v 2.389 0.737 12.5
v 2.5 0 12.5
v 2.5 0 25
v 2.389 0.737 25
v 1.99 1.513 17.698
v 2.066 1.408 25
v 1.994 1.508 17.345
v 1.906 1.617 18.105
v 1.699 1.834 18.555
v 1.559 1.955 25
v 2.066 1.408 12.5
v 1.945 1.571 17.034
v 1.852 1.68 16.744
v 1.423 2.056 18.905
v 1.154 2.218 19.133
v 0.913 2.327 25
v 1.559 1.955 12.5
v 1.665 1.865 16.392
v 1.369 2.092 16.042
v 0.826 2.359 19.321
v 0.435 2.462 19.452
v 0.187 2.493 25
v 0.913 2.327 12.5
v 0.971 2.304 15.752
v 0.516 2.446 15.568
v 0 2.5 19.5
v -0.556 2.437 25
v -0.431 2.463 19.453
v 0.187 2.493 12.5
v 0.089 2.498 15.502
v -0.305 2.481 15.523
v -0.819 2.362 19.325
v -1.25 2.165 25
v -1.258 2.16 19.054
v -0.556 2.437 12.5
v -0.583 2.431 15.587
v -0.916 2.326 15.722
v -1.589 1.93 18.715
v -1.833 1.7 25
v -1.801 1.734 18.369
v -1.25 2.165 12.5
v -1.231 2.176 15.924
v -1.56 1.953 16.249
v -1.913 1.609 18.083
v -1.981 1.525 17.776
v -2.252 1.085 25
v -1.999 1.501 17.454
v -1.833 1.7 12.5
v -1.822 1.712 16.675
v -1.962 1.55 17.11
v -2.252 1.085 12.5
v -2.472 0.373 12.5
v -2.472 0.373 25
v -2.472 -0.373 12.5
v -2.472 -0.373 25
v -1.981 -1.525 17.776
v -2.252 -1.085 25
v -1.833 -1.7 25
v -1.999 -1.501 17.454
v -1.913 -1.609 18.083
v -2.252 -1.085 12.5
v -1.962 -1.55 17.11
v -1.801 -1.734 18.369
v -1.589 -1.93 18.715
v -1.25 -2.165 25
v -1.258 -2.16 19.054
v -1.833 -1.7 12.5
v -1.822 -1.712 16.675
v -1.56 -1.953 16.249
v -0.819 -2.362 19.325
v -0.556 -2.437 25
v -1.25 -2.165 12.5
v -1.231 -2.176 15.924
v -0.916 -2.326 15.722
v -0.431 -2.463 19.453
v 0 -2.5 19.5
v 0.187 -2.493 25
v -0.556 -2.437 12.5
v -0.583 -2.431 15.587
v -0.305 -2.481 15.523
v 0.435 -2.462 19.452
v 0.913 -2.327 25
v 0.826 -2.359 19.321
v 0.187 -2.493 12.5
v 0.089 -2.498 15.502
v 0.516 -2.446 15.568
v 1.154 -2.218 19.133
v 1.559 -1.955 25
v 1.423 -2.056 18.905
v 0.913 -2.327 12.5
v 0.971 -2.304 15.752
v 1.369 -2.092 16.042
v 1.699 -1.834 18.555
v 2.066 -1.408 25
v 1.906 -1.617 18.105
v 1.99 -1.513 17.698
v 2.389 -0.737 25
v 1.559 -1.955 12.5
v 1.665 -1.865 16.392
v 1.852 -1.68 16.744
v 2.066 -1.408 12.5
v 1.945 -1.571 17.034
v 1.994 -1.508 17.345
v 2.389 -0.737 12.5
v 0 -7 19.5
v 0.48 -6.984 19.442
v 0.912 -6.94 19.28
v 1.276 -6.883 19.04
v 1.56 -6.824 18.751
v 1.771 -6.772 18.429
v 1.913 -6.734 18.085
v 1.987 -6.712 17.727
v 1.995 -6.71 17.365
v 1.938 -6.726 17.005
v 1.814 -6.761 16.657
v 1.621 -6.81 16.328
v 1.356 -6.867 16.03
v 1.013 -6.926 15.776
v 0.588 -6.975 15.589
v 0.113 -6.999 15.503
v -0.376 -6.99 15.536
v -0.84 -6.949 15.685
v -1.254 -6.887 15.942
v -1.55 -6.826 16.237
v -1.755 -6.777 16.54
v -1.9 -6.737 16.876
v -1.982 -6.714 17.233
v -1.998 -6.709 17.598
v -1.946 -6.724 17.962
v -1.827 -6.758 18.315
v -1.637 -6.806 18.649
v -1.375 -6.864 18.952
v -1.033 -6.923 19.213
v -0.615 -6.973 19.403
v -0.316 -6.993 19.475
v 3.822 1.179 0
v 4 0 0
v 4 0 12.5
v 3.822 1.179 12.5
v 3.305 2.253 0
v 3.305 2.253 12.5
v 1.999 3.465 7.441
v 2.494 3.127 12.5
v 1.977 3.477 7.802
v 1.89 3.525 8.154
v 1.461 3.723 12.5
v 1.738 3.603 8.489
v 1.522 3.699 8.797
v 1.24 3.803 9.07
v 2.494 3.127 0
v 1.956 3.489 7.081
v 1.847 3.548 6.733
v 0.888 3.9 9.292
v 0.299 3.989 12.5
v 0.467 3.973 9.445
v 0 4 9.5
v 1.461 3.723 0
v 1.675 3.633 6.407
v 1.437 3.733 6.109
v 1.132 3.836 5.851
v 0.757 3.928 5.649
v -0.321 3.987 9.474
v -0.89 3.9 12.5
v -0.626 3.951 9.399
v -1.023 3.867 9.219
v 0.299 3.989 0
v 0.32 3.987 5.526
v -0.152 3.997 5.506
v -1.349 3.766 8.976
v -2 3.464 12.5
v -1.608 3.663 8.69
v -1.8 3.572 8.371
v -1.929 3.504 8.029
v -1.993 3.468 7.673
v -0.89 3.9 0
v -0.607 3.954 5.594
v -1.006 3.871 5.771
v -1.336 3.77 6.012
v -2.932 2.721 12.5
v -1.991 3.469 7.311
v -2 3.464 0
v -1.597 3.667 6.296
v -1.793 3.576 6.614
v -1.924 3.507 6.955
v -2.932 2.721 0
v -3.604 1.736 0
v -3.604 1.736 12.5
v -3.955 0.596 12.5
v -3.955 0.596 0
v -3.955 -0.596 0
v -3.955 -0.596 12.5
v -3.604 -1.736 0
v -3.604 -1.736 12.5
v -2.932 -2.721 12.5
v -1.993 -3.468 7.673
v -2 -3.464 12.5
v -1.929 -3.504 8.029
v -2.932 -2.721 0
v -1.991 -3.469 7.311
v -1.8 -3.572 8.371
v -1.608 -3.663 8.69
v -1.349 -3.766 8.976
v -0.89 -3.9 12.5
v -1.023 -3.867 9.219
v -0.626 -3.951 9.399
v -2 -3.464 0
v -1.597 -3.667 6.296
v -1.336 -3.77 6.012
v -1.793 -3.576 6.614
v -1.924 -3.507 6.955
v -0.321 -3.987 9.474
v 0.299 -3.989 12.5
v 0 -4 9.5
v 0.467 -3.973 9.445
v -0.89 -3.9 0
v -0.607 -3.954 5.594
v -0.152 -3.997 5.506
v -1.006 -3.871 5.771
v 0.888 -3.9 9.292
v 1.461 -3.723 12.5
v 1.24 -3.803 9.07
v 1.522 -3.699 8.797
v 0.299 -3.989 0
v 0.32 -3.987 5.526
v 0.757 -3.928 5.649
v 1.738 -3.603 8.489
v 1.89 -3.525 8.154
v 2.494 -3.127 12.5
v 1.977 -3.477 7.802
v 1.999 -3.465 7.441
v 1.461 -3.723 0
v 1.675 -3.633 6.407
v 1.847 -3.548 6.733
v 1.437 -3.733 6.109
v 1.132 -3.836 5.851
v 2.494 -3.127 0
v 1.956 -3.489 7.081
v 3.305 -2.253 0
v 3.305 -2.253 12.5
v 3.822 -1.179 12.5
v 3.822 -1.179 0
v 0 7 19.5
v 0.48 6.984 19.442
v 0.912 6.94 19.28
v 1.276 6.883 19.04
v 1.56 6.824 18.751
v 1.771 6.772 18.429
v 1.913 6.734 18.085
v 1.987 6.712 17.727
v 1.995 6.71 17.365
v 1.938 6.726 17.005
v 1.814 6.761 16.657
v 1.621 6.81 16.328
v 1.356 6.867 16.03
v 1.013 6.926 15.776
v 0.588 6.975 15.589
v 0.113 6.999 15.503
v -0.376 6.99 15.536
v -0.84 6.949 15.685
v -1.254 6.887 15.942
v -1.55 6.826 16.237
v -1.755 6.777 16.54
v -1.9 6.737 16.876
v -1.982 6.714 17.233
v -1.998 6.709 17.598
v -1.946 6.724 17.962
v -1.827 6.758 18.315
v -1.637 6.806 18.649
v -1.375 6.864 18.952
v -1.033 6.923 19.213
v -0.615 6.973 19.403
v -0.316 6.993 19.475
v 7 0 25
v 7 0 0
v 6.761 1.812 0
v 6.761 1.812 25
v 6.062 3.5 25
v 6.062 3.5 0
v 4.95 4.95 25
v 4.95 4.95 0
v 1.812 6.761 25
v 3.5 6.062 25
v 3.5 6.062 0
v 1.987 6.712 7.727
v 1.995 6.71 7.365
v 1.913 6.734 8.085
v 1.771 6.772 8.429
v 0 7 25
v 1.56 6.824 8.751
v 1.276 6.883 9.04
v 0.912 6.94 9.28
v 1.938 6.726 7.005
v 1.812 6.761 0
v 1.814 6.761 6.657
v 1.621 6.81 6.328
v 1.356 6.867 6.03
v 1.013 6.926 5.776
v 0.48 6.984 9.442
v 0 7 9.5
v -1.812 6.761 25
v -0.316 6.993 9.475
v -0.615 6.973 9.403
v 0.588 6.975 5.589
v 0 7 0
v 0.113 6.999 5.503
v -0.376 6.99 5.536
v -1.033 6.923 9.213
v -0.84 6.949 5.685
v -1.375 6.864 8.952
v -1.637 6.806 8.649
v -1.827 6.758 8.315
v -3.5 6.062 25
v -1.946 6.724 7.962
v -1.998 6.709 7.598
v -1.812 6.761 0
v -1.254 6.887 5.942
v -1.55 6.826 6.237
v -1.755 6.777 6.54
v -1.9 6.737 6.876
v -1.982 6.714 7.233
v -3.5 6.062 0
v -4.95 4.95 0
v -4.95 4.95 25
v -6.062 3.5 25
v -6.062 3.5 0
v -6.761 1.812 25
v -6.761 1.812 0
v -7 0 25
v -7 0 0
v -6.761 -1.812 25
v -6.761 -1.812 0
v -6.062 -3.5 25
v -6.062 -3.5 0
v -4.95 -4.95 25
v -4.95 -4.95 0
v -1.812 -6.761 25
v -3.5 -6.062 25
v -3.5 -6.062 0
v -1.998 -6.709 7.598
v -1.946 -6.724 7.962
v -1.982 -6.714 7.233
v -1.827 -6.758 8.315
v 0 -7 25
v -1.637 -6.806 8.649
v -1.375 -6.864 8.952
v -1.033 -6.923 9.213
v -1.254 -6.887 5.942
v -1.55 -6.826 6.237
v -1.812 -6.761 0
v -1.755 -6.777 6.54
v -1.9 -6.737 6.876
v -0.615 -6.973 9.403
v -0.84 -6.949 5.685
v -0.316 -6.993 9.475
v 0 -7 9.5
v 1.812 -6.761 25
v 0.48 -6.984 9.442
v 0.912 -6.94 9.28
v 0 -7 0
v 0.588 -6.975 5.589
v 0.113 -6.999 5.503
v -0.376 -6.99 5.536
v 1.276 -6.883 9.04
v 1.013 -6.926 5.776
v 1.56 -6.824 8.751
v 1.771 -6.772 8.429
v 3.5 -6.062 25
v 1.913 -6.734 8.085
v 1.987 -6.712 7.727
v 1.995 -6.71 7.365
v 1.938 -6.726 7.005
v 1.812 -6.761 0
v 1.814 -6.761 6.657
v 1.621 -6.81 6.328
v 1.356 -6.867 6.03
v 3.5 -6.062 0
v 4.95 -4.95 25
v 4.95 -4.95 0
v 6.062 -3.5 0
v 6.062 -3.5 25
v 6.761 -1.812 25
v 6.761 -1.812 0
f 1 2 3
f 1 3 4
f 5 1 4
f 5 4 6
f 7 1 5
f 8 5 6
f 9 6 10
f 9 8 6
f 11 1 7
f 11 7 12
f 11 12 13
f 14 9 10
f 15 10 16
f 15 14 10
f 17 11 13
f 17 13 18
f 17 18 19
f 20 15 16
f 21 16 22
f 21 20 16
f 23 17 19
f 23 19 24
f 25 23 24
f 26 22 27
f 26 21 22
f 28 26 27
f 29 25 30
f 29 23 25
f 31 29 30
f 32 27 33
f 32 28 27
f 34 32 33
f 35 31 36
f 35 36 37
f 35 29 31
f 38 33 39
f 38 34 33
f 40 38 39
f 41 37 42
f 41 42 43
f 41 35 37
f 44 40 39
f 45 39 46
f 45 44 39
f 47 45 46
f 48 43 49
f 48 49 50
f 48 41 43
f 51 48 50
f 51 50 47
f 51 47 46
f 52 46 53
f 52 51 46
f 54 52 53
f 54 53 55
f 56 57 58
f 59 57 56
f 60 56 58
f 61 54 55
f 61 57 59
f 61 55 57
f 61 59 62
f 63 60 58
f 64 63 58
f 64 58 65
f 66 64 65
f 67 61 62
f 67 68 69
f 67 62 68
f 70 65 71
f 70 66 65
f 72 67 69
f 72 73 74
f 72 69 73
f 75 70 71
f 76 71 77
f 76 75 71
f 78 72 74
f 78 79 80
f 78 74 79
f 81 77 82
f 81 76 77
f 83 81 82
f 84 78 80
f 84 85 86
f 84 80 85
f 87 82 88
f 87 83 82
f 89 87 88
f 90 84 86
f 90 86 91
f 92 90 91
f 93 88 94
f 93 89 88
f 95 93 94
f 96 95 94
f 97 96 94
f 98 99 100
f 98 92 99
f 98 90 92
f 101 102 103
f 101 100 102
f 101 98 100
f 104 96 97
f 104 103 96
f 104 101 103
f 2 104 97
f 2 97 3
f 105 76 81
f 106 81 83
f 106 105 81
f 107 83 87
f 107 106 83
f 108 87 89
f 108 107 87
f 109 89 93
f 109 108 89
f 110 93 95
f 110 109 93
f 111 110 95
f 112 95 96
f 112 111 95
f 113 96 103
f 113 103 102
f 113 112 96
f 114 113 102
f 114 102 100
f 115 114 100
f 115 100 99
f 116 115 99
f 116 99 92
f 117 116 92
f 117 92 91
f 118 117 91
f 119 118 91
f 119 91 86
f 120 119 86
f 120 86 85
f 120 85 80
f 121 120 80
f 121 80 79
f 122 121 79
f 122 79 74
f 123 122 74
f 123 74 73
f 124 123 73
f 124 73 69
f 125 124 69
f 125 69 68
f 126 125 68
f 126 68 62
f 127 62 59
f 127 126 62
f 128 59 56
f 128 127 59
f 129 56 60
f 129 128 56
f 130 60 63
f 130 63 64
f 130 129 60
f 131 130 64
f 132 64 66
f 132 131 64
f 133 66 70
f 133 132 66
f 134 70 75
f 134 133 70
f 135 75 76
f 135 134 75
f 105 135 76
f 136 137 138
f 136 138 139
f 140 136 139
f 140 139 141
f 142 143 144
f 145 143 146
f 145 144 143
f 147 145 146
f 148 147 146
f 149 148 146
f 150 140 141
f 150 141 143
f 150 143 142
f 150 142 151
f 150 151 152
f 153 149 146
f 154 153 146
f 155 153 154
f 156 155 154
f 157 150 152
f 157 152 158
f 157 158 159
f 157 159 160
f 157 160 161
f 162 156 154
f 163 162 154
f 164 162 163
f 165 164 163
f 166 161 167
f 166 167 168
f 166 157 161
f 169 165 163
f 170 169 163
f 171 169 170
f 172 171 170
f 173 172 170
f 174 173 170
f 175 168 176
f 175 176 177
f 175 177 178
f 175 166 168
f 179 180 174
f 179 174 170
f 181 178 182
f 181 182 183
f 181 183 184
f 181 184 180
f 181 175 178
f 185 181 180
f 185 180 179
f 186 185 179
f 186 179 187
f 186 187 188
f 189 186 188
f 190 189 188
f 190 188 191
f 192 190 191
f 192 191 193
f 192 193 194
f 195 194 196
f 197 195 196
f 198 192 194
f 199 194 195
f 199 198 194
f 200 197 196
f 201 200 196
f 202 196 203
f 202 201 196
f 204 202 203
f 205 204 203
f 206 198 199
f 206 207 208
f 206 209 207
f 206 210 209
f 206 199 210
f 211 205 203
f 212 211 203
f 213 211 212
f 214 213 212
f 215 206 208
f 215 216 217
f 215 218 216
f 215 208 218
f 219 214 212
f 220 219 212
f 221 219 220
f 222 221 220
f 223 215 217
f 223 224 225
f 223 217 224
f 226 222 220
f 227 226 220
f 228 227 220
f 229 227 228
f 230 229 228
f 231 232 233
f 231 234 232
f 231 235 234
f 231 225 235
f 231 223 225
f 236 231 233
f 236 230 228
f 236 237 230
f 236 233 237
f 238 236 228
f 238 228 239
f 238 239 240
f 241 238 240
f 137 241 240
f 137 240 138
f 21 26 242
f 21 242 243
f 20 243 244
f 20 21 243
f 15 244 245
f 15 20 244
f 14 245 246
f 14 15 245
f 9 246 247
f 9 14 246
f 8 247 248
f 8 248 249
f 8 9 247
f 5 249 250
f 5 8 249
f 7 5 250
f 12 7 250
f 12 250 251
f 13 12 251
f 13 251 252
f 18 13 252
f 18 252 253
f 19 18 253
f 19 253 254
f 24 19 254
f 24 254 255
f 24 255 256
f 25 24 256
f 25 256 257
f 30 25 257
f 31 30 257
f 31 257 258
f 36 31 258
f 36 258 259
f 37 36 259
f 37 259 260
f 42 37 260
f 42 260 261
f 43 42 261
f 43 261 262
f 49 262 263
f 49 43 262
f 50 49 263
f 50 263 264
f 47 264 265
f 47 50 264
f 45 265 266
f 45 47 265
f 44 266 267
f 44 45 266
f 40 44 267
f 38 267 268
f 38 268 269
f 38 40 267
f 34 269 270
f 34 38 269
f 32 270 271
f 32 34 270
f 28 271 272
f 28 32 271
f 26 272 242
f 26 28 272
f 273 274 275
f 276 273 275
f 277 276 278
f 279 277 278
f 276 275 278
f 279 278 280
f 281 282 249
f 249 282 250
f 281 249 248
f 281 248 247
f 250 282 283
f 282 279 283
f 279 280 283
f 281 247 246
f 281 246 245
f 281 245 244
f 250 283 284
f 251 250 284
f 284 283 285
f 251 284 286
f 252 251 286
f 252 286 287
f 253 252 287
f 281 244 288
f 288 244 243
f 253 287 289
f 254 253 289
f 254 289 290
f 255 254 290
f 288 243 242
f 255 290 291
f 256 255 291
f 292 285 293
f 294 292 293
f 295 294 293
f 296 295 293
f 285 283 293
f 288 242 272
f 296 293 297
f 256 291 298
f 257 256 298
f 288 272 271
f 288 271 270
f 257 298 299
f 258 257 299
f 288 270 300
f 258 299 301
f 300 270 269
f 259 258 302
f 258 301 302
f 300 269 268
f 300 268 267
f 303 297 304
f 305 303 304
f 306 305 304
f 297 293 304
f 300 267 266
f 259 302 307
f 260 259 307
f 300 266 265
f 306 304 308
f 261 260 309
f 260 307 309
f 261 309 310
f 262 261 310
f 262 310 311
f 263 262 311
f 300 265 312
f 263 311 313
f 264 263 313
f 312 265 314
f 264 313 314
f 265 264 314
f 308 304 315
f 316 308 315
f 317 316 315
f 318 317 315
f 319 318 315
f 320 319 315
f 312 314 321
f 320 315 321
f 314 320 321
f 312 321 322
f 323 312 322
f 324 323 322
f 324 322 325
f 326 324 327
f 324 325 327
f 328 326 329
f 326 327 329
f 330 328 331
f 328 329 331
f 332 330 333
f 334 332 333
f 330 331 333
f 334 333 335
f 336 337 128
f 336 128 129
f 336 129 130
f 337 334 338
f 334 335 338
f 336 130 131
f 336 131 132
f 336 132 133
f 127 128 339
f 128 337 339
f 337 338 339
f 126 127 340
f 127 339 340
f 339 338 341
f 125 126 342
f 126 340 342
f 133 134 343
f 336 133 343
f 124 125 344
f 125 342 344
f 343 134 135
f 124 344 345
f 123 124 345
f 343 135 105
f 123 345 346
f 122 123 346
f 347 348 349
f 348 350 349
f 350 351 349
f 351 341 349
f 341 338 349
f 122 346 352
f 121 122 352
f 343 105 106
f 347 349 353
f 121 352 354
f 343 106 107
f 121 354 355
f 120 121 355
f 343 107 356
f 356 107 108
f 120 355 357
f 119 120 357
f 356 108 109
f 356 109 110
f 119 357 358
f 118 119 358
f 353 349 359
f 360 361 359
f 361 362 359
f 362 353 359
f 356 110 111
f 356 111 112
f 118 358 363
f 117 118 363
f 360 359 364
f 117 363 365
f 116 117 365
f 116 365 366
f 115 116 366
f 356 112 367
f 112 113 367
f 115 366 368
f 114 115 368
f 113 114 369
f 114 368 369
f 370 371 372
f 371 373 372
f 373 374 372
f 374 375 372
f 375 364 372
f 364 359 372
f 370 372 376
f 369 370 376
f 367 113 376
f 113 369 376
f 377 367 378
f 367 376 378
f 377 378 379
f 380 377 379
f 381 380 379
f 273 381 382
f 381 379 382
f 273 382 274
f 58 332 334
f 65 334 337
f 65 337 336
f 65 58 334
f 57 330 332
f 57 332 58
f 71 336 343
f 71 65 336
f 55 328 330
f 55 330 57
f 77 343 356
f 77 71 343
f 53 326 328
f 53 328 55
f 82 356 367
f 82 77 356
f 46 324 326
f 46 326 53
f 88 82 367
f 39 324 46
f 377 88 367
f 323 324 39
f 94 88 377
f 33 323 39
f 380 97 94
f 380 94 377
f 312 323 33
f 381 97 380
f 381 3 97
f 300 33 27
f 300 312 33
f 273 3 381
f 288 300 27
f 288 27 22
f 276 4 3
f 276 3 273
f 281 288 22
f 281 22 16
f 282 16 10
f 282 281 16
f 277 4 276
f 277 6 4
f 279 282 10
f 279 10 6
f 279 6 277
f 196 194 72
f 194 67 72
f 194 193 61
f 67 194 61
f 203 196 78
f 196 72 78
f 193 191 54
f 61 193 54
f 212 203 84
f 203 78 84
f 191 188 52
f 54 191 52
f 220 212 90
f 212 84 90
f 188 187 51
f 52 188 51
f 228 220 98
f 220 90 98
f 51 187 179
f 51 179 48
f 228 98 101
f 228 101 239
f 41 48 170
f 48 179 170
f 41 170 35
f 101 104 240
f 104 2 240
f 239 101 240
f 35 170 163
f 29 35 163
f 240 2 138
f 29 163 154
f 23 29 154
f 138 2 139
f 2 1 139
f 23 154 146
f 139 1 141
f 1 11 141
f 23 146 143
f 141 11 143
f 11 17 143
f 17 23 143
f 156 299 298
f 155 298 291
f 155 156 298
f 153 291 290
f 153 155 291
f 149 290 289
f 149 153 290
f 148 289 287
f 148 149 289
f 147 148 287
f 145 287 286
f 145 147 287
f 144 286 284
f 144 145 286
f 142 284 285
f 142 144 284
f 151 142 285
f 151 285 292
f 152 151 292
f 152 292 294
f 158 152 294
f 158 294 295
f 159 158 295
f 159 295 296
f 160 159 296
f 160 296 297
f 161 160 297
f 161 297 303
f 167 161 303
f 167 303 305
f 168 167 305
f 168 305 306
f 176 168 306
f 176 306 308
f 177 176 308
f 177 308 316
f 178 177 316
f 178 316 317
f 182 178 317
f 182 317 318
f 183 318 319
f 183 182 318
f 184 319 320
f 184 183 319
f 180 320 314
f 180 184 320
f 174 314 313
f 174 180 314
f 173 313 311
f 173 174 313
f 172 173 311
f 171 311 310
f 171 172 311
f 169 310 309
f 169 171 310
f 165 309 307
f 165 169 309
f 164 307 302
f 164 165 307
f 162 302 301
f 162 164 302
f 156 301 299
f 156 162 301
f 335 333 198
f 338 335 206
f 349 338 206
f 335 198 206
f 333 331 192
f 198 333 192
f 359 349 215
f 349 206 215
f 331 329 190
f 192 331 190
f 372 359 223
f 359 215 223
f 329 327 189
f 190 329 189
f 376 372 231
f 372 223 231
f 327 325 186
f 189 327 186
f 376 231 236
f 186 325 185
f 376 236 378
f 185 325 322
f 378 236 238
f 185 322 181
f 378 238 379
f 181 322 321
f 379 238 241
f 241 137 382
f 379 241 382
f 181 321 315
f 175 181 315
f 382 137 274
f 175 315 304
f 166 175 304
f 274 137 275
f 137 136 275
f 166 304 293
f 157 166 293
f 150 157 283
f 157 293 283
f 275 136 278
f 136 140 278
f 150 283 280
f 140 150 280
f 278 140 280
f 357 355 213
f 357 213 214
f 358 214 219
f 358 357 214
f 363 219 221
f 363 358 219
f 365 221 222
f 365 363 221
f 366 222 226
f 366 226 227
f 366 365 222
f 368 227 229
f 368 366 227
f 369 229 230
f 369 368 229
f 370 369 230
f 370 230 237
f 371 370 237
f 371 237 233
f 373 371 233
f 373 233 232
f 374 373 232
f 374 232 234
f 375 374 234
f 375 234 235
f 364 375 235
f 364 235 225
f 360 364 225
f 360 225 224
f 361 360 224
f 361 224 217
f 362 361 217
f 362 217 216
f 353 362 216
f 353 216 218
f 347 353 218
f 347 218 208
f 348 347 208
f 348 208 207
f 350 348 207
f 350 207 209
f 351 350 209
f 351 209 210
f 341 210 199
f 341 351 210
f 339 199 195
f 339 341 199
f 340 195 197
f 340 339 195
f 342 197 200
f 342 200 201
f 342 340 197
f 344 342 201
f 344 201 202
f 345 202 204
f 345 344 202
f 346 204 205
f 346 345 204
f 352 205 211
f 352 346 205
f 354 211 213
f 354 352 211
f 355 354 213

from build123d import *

# Parameters (mm, degrees)
SKETCH1_R               = 7
SKETCH1_R_2             = 4
BOSS_EXTRUDE1_DEPTH     = 25
BOSS_EXTRUDE2_START     = -12.5
SKETCH2_R               = 4
SKETCH2_R_2             = 2.5
BOSS_EXTRUDE2_DEPTH     = 12.5
CUT_EXTRUDE1_DEPTH      = 27.888659319
CUT_EXTRUDE1_DEPTH_BACK = 27.888659319
SKETCH3_R               = 2


with BuildPart() as part:
    # Sketch1 → Boss-Extrude1 (new body)
    with BuildSketch(Plane.XY):
        Circle(SKETCH1_R)
        Circle(SKETCH1_R_2, mode=Mode.SUBTRACT)
    extrude(amount=BOSS_EXTRUDE1_DEPTH)

    # Sketch2 → Boss-Extrude2 (add)
    with BuildSketch(Plane.XY.offset(25).offset(BOSS_EXTRUDE2_START)):
        Circle(SKETCH2_R)
        Circle(SKETCH2_R_2, mode=Mode.SUBTRACT)
    extrude(amount=BOSS_EXTRUDE2_DEPTH)

    # Sketch3 → Cut-Extrude1 (cut, two sides: drawn at the far end of the back side and taken through both)
    with BuildSketch(Plane(origin=(0, 0, 0), x_dir=(1, 0, 0), z_dir=(0, 1, 0)).offset(-CUT_EXTRUDE1_DEPTH_BACK)):
        with Locations(Location((0, -7.5, 0), (0, 0, 270))):
            Circle(SKETCH3_R)
        with Locations(Location((0, -17.5, 0), (0, 0, 270))):
            Circle(SKETCH3_R)
    extrude(amount=CUT_EXTRUDE1_DEPTH + CUT_EXTRUDE1_DEPTH_BACK, mode=Mode.SUBTRACT)


solid = part.part
